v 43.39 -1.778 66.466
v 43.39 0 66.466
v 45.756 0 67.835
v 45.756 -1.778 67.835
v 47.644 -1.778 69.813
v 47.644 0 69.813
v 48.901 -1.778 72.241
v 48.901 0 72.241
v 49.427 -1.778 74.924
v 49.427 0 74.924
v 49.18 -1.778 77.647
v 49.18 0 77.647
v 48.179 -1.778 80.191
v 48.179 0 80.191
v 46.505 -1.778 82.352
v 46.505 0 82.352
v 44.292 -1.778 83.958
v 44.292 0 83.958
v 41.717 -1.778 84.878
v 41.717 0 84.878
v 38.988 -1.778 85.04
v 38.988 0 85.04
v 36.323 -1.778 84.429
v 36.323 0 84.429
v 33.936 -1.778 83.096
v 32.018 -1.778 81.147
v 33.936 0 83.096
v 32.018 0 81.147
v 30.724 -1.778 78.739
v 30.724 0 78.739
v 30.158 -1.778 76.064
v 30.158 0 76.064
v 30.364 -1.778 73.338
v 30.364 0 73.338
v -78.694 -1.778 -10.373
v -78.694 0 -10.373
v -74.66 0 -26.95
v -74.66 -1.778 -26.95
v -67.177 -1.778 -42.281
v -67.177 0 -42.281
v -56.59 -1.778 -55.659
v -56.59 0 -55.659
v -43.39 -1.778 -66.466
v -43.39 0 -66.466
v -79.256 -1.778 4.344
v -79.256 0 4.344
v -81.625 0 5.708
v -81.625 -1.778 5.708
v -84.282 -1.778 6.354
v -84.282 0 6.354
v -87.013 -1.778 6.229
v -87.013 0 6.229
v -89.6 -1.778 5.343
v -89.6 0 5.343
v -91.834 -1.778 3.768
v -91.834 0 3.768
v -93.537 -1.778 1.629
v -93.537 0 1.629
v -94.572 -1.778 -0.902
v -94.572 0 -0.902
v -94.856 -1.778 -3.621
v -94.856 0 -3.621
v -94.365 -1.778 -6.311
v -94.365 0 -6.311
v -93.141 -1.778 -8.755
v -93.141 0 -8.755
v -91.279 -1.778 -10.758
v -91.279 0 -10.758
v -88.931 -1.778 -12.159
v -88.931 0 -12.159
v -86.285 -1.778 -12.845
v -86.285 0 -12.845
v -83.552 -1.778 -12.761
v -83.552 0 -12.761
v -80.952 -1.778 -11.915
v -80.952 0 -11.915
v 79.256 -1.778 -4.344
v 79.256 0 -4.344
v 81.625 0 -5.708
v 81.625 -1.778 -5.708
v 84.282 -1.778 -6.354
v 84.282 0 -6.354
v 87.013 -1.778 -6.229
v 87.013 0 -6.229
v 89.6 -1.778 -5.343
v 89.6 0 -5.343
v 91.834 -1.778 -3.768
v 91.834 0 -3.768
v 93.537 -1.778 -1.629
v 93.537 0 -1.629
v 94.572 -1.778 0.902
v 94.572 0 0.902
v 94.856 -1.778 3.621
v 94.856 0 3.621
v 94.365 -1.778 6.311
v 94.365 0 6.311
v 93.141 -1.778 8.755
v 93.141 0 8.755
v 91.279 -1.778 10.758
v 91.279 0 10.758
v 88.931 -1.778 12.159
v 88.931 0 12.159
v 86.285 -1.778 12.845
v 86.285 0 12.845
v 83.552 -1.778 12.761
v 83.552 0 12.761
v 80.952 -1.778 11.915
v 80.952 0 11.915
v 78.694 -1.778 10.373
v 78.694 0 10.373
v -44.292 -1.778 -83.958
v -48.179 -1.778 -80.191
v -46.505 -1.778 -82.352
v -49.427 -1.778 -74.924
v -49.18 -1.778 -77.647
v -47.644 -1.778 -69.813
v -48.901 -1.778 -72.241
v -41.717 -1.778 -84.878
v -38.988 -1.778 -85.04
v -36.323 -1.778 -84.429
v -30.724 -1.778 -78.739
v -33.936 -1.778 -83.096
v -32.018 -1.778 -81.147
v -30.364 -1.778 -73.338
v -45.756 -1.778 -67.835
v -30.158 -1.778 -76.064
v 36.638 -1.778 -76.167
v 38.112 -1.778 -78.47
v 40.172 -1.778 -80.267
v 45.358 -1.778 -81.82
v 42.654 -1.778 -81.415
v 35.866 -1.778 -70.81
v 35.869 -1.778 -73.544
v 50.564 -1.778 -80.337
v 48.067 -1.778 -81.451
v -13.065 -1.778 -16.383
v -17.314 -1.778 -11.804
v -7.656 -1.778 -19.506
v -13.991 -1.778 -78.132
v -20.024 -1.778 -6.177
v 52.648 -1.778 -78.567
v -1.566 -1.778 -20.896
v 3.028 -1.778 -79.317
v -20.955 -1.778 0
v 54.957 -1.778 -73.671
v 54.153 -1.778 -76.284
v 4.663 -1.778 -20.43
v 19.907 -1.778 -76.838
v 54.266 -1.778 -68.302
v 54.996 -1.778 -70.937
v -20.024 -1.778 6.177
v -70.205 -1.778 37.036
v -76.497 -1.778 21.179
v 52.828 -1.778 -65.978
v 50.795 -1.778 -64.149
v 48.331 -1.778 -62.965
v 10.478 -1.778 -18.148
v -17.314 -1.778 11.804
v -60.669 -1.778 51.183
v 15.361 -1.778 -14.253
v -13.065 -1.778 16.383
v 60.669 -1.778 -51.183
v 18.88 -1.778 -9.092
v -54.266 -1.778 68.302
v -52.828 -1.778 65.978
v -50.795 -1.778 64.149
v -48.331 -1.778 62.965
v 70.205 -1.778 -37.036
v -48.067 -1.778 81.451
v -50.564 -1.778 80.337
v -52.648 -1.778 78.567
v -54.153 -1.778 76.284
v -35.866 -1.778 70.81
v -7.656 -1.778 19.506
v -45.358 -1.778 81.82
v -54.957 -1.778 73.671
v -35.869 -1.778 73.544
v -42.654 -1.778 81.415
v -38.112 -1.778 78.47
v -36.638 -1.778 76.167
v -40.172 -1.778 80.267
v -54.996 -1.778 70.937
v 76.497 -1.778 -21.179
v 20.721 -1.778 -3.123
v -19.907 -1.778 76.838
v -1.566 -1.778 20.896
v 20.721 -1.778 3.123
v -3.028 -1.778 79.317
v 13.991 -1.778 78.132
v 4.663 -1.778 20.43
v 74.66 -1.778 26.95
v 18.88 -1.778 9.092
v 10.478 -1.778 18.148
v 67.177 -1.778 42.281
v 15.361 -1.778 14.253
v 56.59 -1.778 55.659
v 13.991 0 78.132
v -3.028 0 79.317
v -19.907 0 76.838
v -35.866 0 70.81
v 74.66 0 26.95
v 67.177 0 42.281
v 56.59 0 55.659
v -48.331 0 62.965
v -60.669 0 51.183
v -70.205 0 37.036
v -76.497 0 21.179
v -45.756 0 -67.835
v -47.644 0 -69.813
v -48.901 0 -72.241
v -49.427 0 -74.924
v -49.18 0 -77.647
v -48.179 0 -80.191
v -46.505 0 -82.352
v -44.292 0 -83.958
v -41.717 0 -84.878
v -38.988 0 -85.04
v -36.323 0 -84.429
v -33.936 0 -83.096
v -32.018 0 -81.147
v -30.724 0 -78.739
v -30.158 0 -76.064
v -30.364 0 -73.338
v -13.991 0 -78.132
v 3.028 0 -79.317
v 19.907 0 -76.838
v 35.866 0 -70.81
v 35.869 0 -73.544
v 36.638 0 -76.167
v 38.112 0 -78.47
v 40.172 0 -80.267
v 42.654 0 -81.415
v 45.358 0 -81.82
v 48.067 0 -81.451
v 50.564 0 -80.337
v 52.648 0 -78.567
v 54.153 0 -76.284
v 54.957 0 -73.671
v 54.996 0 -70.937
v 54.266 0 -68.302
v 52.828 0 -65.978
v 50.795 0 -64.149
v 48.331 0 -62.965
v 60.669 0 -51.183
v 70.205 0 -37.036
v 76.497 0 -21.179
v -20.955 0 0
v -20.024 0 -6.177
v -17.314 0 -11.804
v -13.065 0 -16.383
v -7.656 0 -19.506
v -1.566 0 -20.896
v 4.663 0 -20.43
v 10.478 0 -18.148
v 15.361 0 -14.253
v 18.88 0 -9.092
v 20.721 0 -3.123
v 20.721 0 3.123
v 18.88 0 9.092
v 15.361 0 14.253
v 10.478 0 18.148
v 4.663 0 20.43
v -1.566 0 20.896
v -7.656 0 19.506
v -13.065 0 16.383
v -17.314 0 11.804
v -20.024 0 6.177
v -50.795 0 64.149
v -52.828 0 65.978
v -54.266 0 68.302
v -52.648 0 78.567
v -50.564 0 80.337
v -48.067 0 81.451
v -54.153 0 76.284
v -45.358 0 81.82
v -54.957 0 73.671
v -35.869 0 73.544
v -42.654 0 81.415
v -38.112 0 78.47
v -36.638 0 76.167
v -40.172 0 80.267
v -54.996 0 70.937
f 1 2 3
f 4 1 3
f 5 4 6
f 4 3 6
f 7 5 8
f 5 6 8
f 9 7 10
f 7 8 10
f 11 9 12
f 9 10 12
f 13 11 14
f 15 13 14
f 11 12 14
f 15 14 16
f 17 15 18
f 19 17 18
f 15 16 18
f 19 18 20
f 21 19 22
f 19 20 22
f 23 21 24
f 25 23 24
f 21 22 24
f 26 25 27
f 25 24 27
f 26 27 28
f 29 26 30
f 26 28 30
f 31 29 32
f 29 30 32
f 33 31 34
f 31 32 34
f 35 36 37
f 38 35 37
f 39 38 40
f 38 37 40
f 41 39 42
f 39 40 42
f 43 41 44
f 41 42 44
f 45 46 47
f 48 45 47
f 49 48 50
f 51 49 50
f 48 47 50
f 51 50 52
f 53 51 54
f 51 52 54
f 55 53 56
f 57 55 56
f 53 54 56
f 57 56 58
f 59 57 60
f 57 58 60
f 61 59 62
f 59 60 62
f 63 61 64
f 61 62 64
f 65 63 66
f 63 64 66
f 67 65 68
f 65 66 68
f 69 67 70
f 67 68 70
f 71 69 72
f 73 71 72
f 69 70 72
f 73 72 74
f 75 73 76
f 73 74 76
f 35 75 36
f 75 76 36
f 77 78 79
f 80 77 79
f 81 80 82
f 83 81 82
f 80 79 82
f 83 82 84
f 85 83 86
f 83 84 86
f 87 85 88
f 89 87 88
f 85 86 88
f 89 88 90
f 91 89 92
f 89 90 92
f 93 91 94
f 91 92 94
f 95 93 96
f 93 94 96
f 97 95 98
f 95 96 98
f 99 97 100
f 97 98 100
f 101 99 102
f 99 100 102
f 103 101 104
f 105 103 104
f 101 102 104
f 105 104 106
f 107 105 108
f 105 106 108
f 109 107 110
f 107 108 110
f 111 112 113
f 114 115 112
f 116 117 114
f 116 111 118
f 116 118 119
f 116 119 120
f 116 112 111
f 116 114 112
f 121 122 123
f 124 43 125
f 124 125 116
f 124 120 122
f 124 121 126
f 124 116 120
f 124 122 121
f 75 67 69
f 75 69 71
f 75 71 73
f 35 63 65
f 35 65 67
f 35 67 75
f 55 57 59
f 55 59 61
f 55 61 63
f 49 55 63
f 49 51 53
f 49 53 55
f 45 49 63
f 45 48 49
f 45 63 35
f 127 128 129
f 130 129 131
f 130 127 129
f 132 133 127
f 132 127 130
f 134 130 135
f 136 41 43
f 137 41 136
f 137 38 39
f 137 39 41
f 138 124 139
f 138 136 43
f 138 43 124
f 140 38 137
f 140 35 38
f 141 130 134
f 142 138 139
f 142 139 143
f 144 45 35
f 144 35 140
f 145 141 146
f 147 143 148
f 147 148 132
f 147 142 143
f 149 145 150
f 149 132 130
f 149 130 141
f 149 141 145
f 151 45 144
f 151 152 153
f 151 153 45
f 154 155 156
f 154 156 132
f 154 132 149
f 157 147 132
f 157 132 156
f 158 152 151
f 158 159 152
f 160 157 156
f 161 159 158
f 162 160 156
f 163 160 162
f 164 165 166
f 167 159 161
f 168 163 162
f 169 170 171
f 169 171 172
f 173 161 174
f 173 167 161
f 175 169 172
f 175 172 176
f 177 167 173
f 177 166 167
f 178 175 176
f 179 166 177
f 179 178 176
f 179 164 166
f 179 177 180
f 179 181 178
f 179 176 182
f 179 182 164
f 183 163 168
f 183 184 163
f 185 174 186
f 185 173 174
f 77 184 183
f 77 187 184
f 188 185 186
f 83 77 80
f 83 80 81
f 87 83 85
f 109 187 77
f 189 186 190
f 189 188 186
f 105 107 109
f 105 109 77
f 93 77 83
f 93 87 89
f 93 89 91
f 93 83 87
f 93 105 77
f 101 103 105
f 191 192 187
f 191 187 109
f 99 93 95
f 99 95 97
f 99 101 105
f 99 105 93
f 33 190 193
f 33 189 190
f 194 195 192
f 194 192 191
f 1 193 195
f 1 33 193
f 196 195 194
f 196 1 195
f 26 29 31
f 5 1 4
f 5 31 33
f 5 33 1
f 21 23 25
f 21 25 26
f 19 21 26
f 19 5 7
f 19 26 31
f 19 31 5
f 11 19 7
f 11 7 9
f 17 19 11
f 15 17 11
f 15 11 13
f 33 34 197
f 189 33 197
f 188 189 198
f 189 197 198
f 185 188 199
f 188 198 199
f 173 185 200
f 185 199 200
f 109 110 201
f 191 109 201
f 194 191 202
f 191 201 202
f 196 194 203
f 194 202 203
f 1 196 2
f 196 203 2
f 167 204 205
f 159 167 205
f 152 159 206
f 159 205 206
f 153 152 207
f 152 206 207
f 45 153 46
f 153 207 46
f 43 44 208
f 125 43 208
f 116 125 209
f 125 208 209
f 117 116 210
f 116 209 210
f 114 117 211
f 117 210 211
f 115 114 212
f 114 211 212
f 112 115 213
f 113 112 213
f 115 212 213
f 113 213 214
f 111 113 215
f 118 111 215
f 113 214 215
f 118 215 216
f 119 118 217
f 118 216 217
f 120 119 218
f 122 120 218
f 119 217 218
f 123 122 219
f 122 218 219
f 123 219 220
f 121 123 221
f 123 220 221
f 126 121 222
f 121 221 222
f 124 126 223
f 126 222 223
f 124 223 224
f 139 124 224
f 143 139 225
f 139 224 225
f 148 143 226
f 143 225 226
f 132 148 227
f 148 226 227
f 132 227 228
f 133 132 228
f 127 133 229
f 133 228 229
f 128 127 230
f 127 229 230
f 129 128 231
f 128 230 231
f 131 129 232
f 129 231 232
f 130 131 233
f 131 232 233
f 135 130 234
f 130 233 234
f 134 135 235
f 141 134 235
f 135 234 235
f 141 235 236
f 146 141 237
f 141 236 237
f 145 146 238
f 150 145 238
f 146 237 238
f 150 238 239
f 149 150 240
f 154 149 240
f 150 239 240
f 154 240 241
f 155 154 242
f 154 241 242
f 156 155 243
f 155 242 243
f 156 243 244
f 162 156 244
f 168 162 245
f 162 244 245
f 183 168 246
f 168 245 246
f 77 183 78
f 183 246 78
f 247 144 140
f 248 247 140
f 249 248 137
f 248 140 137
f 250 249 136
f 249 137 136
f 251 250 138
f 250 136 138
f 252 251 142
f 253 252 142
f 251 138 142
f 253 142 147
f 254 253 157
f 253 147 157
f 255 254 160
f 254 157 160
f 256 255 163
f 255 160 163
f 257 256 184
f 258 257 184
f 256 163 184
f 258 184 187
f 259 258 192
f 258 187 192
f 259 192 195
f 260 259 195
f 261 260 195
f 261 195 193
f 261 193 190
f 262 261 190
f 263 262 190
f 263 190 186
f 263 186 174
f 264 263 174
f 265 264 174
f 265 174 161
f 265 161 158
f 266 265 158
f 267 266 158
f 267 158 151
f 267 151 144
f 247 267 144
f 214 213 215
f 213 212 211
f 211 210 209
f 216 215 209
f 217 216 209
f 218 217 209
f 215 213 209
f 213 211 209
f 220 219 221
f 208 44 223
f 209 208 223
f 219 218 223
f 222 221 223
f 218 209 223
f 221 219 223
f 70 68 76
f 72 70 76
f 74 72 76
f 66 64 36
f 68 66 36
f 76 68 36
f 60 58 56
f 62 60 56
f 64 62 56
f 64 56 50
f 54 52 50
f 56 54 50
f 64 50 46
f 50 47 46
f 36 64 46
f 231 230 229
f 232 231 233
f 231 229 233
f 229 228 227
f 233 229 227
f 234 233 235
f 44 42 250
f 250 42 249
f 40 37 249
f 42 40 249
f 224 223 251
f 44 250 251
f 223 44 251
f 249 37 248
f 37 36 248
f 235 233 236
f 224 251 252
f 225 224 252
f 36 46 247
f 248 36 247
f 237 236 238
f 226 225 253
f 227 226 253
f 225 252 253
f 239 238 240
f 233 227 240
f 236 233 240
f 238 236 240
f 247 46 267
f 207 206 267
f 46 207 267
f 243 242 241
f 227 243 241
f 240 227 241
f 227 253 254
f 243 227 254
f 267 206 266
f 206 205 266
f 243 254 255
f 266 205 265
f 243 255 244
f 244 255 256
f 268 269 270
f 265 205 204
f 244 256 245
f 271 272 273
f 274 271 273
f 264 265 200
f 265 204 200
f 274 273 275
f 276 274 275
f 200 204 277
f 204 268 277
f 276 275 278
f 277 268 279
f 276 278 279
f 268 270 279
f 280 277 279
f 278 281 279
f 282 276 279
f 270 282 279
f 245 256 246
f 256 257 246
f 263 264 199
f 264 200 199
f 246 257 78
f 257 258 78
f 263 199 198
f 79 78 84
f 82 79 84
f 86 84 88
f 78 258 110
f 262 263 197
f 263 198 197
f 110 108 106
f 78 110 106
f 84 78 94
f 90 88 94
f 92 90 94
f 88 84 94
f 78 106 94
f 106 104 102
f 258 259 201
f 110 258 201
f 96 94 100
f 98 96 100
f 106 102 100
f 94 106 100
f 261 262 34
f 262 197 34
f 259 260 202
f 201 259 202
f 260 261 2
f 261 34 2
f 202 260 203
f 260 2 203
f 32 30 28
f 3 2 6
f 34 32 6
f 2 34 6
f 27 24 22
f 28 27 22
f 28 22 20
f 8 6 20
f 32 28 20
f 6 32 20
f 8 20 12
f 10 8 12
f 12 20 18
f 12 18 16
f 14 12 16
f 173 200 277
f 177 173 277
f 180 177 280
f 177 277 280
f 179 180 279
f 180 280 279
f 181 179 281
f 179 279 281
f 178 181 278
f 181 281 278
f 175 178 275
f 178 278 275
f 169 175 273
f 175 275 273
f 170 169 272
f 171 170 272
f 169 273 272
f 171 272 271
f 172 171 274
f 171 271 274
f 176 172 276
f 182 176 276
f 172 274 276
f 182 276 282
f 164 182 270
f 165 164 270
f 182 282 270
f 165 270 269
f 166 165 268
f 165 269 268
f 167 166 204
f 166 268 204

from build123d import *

# Parameters (mm, degrees)
F1_DEPTH = 1.778
F2_D     = 41.91


with BuildPart() as f1:
    # F0 (on Front) → F1 (new body)
    with BuildSketch(Plane.XZ):
        with BuildLine():
            ThreePointArc((35.866425, -70.809534), (50.563695, -80.336742), (48.330608, -62.964617))
            ThreePointArc((48.330608, -62.964617), (42.280856, -67.17678), (35.866425, -70.809534))
        make_face()
        with BuildLine():
            ThreePointArc((30.363654, 73.337843), (37.03637, 70.204686), (43.389643, 66.466003))
            ThreePointArc((43.389643, 66.466003), (44.291812, 83.957815), (30.363654, 73.337843))
        make_face()
        with BuildLine():
            ThreePointArc((-48.330608, 62.964617), (-42.280856, 67.17678), (-35.866425, 70.809534))
            ThreePointArc((-35.866425, 70.809534), (-50.563695, 80.336742), (-48.330608, 62.964617))
        make_face()
        with BuildLine():
            ThreePointArc((78.694262, 10.373226), (79.204633, 5.197769), (79.375, 0))
            ThreePointArc((79.375, 0), (79.345261, -2.17258), (79.256068, -4.343532))
            ThreePointArc((79.256068, -4.343532), (94.855507, 3.621073), (78.694262, 10.373226))
        make_face()
        with BuildLine():
            ThreePointArc((-43.389643, -66.466003), (-44.291812, -83.957815), (-30.363654, -73.337843))
            ThreePointArc((-30.363654, -73.337843), (-37.03637, -70.204686), (-43.389643, -66.466003))
        make_face()
        with BuildLine():
            ThreePointArc((79.256068, -4.343532), (79.345261, -2.17258), (79.375, 0))
            ThreePointArc((79.375, 0), (79.204633, 5.197769), (78.694262, 10.373226))
            ThreePointArc((78.694262, 10.373226), (67.17678, 42.280856), (43.389643, 66.466003))
            ThreePointArc((43.389643, 66.466003), (37.03637, 70.204686), (30.363654, 73.337843))
            ThreePointArc((30.363654, 73.337843), (-3.027905, 79.317226), (-35.866425, 70.809534))
            ThreePointArc((-35.866425, 70.809534), (-42.280856, 67.17678), (-48.330608, 62.964617))
            ThreePointArc((-48.330608, 62.964617), (-70.204686, 37.03637), (-79.256068, 4.343532))
            ThreePointArc((-79.256068, 4.343532), (-79.317226, -3.027905), (-78.694262, -10.373226))
            ThreePointArc((-78.694262, -10.373226), (-67.17678, -42.280856), (-43.389643, -66.466003))
            ThreePointArc((-43.389643, -66.466003), (-37.03637, -70.204686), (-30.363654, -73.337843))
            ThreePointArc((-30.363654, -73.337843), (3.027905, -79.317226), (35.866425, -70.809534))
            ThreePointArc((35.866425, -70.809534), (42.280856, -67.17678), (48.330608, -62.964617))
            ThreePointArc((48.330608, -62.964617), (70.204686, -37.03637), (79.256068, -4.343532))
        make_face()
        with BuildLine():
            ThreePointArc((-78.694262, -10.373226), (-79.317226, -3.027905), (-79.256068, 4.343532))
            ThreePointArc((-79.256068, 4.343532), (-94.855507, -3.621073), (-78.694262, -10.373226))
        make_face()
    extrude(amount=F1_DEPTH)

    # F2 (through all)
    with Locations(Plane(origin=(0, 0, 0), x_dir=(1, 0, 0), z_dir=(0, 1, 0))):
        with Locations((0, 0)):
            Hole(F2_D / 2)


solid = f1.part
